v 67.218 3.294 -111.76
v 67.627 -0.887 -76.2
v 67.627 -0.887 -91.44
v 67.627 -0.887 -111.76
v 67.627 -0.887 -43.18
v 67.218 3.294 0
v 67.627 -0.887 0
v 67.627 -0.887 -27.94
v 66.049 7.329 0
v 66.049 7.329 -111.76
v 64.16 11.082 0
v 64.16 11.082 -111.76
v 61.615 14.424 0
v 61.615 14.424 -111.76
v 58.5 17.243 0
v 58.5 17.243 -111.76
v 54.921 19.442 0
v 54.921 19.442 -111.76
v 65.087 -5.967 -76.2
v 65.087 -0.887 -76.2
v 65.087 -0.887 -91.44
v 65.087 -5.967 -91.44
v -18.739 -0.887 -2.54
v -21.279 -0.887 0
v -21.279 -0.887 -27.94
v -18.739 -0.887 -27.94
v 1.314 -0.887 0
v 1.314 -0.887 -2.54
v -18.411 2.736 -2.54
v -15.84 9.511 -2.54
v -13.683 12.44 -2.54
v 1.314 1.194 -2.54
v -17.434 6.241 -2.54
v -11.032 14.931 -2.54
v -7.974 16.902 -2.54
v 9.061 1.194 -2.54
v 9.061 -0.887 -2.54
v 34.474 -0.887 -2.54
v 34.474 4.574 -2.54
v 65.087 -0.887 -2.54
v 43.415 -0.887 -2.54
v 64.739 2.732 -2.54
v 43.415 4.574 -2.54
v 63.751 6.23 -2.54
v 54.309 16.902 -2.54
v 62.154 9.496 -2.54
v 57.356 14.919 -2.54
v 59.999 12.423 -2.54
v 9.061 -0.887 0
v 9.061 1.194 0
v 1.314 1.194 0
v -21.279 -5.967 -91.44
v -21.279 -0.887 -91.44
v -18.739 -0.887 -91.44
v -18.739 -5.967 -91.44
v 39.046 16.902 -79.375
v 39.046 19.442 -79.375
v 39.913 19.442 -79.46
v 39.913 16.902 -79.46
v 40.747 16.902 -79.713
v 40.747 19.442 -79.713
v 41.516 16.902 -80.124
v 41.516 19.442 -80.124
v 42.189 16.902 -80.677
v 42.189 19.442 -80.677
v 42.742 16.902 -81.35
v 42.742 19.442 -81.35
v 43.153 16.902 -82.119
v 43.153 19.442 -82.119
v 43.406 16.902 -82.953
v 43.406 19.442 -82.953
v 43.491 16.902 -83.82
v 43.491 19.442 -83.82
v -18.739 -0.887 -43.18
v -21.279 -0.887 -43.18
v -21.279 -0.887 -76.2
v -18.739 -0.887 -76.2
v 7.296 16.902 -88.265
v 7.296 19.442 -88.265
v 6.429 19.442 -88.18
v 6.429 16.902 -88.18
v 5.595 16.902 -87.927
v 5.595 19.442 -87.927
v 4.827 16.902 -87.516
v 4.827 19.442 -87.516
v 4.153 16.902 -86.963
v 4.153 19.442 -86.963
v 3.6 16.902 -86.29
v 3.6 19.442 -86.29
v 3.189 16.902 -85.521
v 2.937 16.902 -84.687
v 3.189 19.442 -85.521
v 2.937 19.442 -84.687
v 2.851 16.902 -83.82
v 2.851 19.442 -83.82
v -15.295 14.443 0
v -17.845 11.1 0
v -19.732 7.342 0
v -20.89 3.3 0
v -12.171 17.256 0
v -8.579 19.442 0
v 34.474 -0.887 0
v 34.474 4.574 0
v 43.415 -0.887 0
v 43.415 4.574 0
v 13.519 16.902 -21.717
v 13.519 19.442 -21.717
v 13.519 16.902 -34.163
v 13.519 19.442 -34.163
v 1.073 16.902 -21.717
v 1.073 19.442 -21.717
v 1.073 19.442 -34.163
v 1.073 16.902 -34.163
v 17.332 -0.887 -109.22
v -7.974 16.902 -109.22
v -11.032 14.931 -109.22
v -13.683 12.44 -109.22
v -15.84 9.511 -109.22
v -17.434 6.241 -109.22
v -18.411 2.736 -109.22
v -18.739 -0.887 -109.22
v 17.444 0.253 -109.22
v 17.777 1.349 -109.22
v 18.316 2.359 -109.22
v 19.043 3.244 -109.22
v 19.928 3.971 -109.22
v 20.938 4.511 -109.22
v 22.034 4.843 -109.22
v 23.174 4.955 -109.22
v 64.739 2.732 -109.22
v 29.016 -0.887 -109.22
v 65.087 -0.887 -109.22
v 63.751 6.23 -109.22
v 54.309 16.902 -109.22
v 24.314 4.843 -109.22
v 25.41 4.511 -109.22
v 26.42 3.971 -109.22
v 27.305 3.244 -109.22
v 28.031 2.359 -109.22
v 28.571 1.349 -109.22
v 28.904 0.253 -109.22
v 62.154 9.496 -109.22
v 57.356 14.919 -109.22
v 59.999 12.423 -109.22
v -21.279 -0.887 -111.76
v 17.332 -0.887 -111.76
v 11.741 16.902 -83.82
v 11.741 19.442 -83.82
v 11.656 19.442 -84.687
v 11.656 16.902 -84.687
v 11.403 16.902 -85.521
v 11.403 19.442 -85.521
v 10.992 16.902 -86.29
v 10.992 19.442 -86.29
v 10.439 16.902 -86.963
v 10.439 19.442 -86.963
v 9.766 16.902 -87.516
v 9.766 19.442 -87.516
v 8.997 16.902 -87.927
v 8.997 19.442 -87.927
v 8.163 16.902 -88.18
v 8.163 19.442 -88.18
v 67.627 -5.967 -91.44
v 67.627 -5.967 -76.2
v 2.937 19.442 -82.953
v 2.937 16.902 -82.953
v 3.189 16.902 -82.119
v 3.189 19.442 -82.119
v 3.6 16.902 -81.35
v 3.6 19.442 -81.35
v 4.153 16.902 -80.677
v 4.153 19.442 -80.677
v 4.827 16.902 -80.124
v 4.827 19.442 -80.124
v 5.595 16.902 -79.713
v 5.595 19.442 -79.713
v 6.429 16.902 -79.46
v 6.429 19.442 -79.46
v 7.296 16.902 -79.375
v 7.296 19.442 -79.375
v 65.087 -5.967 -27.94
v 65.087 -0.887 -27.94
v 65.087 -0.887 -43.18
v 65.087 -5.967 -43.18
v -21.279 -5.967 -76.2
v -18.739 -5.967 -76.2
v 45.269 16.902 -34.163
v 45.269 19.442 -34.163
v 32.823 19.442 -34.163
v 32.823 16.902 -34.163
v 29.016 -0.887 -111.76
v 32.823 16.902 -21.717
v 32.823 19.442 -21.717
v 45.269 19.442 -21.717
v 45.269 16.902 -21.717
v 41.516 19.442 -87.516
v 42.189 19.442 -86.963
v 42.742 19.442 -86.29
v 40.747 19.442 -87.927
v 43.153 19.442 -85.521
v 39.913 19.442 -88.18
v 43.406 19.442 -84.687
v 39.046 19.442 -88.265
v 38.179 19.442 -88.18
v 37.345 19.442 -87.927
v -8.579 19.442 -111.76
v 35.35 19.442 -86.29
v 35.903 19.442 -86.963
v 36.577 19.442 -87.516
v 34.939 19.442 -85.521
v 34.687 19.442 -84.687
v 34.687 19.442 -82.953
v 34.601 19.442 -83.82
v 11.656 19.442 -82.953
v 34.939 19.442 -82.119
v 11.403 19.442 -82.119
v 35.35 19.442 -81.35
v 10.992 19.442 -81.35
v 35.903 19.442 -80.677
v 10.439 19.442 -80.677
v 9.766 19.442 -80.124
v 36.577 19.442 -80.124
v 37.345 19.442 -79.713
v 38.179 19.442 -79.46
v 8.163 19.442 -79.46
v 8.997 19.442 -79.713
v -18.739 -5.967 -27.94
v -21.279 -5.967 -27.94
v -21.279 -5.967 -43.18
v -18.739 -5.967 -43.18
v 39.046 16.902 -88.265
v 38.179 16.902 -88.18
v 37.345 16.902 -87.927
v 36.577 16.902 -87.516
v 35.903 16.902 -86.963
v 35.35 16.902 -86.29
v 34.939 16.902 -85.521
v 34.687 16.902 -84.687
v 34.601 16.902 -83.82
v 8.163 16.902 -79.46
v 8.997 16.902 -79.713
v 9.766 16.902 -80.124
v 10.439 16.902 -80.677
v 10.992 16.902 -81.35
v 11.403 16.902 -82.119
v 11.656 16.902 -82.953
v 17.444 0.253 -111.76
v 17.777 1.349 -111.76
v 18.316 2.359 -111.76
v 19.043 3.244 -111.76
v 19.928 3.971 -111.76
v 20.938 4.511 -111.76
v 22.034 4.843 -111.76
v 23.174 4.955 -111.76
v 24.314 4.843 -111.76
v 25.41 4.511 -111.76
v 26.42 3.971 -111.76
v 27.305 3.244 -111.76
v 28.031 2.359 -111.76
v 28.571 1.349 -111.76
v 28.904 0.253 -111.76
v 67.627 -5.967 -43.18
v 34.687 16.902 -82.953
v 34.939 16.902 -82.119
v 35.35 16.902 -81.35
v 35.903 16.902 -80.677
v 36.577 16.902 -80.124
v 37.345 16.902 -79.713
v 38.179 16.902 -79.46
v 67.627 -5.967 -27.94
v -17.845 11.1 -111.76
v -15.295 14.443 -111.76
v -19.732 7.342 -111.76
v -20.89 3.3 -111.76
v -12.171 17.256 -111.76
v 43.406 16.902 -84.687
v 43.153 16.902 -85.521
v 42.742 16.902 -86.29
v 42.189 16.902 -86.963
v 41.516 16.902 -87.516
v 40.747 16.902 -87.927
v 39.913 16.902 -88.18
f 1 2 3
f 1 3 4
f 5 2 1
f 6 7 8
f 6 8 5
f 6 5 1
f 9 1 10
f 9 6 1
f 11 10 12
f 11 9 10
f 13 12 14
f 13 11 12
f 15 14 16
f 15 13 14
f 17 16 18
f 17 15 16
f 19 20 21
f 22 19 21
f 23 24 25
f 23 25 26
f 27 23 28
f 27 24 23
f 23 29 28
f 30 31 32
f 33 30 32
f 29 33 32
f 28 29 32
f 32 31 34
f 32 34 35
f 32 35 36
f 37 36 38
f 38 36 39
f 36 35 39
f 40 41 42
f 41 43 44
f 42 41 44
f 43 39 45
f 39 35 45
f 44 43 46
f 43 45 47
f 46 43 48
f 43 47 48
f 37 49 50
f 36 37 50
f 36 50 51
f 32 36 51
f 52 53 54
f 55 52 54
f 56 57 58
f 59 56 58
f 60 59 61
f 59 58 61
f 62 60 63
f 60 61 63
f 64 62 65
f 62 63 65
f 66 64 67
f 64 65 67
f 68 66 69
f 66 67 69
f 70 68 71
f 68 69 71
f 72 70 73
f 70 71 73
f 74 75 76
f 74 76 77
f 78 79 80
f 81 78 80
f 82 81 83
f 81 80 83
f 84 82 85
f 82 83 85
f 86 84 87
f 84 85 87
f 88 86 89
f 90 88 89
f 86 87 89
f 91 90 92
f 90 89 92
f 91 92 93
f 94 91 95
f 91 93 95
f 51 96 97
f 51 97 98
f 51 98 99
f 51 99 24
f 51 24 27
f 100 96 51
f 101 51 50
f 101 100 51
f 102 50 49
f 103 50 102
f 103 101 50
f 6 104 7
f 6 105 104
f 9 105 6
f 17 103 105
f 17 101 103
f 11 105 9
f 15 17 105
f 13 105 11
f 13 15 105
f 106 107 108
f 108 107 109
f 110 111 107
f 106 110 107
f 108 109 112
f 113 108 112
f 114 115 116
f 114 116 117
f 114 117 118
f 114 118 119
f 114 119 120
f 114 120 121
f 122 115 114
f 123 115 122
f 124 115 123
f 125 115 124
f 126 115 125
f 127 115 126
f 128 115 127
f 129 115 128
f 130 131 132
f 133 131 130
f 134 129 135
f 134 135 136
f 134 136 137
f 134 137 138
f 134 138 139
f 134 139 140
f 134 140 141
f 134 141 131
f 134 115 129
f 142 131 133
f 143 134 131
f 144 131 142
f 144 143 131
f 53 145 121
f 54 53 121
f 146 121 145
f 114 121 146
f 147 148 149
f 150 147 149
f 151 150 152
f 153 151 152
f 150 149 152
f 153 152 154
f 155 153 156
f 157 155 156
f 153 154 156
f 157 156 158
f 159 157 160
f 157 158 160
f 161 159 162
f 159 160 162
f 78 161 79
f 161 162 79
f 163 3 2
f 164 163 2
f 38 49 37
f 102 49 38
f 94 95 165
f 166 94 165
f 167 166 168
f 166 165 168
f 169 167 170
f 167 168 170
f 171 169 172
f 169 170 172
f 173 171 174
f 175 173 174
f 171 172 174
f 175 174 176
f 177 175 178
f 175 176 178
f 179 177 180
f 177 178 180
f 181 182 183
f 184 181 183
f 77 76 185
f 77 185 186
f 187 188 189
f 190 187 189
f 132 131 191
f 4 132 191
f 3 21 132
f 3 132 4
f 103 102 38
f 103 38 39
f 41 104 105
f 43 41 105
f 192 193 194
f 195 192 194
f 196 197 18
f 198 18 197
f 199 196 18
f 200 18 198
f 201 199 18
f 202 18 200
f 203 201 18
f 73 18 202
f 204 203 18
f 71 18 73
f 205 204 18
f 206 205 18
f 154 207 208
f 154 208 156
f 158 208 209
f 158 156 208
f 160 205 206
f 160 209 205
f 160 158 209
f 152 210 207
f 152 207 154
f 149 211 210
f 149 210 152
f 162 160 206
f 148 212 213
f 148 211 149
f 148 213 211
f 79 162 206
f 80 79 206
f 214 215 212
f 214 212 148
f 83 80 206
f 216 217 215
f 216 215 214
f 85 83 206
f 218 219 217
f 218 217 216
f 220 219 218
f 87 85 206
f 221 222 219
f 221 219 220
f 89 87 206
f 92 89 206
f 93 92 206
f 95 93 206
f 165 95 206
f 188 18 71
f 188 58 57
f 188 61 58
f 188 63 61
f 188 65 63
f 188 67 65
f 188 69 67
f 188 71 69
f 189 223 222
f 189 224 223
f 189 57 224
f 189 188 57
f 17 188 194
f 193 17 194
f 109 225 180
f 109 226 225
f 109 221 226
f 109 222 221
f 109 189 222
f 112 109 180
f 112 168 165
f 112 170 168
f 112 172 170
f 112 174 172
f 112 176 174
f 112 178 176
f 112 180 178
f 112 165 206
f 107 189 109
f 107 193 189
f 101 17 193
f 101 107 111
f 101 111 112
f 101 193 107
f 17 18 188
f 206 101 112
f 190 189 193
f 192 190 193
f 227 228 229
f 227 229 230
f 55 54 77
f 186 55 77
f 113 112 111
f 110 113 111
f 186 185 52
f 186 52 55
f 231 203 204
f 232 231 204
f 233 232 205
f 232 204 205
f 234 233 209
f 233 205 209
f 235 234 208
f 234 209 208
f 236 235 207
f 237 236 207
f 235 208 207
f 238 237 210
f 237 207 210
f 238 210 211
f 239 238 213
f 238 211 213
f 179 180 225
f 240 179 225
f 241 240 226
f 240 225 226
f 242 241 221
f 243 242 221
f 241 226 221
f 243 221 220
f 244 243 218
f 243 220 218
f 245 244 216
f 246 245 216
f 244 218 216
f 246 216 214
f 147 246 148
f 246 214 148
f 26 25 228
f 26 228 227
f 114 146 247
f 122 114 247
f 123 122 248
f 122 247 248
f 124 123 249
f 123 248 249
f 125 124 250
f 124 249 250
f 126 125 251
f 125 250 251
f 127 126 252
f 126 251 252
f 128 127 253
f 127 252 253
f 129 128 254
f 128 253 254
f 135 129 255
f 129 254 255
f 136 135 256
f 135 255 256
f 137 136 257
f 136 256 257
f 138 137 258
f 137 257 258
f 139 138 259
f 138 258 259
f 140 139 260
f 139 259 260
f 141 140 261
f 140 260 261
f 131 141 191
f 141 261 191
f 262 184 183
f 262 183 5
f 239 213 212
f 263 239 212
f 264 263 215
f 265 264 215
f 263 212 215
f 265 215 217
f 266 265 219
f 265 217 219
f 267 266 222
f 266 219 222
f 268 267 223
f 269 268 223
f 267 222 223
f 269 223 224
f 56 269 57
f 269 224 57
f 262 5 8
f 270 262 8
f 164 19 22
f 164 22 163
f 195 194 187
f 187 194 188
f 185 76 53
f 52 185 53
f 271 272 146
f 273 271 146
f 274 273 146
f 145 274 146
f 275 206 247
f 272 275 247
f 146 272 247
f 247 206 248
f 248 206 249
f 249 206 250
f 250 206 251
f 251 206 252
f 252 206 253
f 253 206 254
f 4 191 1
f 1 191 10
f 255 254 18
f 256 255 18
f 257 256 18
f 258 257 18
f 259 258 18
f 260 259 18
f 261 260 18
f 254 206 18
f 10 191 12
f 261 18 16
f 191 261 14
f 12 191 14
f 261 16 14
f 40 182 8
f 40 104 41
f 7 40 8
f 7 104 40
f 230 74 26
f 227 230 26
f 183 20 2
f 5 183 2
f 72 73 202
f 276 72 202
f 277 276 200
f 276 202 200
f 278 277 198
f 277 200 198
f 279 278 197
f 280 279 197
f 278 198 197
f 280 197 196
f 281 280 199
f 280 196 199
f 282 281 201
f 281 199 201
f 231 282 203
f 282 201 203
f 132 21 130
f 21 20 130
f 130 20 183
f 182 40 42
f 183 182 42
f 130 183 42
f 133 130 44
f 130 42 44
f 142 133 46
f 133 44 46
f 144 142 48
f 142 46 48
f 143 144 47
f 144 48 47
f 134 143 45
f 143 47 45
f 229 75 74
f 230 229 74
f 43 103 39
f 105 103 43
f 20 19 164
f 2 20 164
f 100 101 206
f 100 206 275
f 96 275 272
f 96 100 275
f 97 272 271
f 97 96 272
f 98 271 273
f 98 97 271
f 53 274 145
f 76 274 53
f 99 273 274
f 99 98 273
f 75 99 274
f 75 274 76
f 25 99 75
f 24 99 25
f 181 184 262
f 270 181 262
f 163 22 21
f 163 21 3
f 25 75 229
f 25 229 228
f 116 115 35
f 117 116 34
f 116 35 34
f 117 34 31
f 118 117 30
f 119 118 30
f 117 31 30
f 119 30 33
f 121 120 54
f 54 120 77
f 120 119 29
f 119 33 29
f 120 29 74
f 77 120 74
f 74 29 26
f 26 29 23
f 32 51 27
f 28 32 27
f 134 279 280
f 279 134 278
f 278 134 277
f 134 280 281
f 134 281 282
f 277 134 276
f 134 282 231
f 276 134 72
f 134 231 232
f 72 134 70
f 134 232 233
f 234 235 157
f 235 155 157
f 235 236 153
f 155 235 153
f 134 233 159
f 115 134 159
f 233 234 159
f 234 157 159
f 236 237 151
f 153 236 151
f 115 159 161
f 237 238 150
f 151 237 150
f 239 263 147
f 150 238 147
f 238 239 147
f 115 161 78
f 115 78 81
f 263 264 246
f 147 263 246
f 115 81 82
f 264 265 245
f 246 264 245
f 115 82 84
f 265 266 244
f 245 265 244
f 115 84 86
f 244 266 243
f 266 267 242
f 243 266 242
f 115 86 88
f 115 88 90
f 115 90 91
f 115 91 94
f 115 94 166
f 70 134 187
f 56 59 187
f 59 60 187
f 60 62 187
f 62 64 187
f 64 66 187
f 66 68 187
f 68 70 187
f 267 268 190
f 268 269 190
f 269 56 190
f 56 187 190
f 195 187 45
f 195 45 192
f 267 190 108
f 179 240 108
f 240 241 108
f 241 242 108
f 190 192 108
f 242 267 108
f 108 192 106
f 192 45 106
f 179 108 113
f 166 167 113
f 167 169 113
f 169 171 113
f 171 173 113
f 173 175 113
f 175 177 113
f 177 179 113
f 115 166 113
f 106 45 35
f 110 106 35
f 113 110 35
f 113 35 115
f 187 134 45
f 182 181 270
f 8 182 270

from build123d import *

# Parameters (mm, degrees)
F0_W      = 8.9408
F0_H      = 5.461
F1_DEPTH  = 111.76
F2_T      = -2.54
F4_DEPTH  = 25.4
F5_DEPTH  = 25.4
F7_DEPTH  = 25.4
F8_W      = 2.5400399546
F8_H      = 7.62
F9_DEPTH  = 5.08
F10_W     = 2.5400002226
F10_H     = 15.24
F10_H_2   = 7.62
F11_DEPTH = 5.08
F12_W     = 6.223
F12_H     = 6.223
F13_DEPTH = 25.4


with BuildPart() as f1:
    # F0 (on Top) → F1 (new body)
    with BuildSketch(Plane.XY):
        with BuildLine():
            Line((54.9210952491, 19.4422315109), (-8.5789047509, 19.4422315109))
            ThreePointArc((-8.5789047509, 19.4422315109), (-17.8451170094, 11.099606562), (-21.2789029923, -0.8866853785))
            Line((-21.2789029923, -0.8866853785), (9.0740952491, -0.8866853785))
            Line((9.0740952491, -0.8866853785), (34.4740952491, -0.8866853785))
            Line((34.4740952491, -0.8866853785), (34.4740952491, 4.5743146215))
            Line((34.4740952491, 4.5743146215), (43.4148952491, 4.5743146215))
            Line((43.4148952491, 4.5743146215), (43.4148952491, -0.8866853785))
            Line((43.4148952491, -0.8866853785), (67.6266683049, -0.8866853785))
            ThreePointArc((67.6266683049, -0.8866853785), (64.1599500532, 11.0815657388), (54.9210952491, 19.4422315109))
        make_face()
        with Locations((38.9444952491, 1.8438146215)):
            Rectangle(F0_W, F0_H)
    extrude(amount=-F1_DEPTH)

    # F2
    f2_openings = [f1.faces().sort_by_distance(p)[0] for p in [
        (23.173883, -0.886685, -55.88),
    ]]
    offset(amount=F2_T, openings=f2_openings)

    # F3 (on face) → F4 (cut)
    with BuildSketch(Plane.XY):
        Polygon((1.3137662318, 1.1936101676), (1.3137662318, -0.8866853785), (9.0607662318, -0.8866853785), (9.0607662318, 1.1936101676), (1.3270952491, 1.1936101676), align=None)
    extrude(amount=-F4_DEPTH, mode=Mode.SUBTRACT)

    # F0 (on Top) → F5 (cut)
    with BuildSketch(Plane.XY):
        with Locations((38.9444952491, 1.8438146215)):
            Rectangle(F0_W, F0_H)
    extrude(amount=-F5_DEPTH, mode=Mode.SUBTRACT)

    # F6 (on face) → F7 (cut)
    with BuildSketch(Plane(origin=(0, 0, -111.76), x_dir=(1, 0, 0), z_dir=(0, 0, -1))):
        with BuildLine():
            Line((29.0158826563, 0.8866853785), (17.3318826563, 0.8866853785))
            ThreePointArc((17.3318826563, 0.8866853785), (23.1738826563, -4.9553146215), (29.0158826563, 0.8866853785))
        make_face()
    extrude(amount=-F7_DEPTH, mode=Mode.SUBTRACT)

    # F8 (on face) → F9 (join)
    with BuildSketch(Plane.XZ.offset(0.8866853785)):
        with Locations((66.3566483276, -31.75)):
            Rectangle(F8_W, F8_H)
        with Locations((66.3566483276, -39.37)):
            Rectangle(F8_W, F8_H)
        with Locations((66.3566483276, -80.01)):
            Rectangle(F8_W, F8_H)
        with Locations((66.3566483276, -87.63)):
            Rectangle(F8_W, F8_H)
    extrude(amount=F9_DEPTH)

    # F10 (on face) → F11 (join)
    with BuildSketch(Plane.XZ.offset(0.8866853785)):
        with Locations((-20.008902881, -35.56)):
            Rectangle(F10_W, F10_H)
        with Locations((-20.008902881, -80.01)):
            Rectangle(F10_W, F10_H_2)
        with Locations((-20.008902881, -87.63)):
            Rectangle(F10_W, F10_H_2)
    extrude(amount=F11_DEPTH)

    # F12 (on face) → F13 (cut)
    with BuildSketch(Plane(origin=(0, 19.4422315109, 0), x_dir=(-1, 0, 0), z_dir=(0, 1, 0))):
        with Locations((-4.1845952491, -24.8285)):
            Rectangle(F12_W, F12_H)
        with Locations((-10.4075952491, -24.8285)):
            Rectangle(F12_W, F12_H)
        with Locations((-10.4075952491, -31.0515)):
            Rectangle(F12_W, F12_H)
        with Locations((-4.1845952491, -31.0515)):
            Rectangle(F12_W, F12_H)
        with Locations((-35.9345952491, -24.8285)):
            Rectangle(F12_W, F12_H)
        with Locations((-42.1575952491, -24.8285)):
            Rectangle(F12_W, F12_H)
        with Locations((-42.1575952491, -31.0515)):
            Rectangle(F12_W, F12_H)
        with Locations((-35.9345952491, -31.0515)):
            Rectangle(F12_W, F12_H)
        with BuildLine():
            Line((-39.0460952491, -83.82), (-39.0460952491, -79.375))
            ThreePointArc((-39.0460952491, -79.375), (-42.1891848914, -80.6769103576), (-43.4910952491, -83.82))
            Line((-43.4910952491, -83.82), (-39.0460952491, -83.82))
        make_face()
        with BuildLine():
            Line((-39.0460952491, -88.265), (-39.0460952491, -83.82))
            Line((-39.0460952491, -83.82), (-43.4910952491, -83.82))
            ThreePointArc((-43.4910952491, -83.82), (-42.1891848914, -86.9630896424), (-39.0460952491, -88.265))
        make_face()
        with BuildLine():
            ThreePointArc((-39.0460952491, -88.265), (-35.9030056067, -86.9630896424), (-34.6010952491, -83.82))
            Line((-34.6010952491, -83.82), (-39.0460952491, -83.82))
            Line((-39.0460952491, -83.82), (-39.0460952491, -88.265))
        make_face()
        with BuildLine():
            Line((-39.0460952491, -83.82), (-34.6010952491, -83.82))
            ThreePointArc((-34.6010952491, -83.82), (-35.9030056067, -80.6769103576), (-39.0460952491, -79.375))
            Line((-39.0460952491, -79.375), (-39.0460952491, -83.82))
        make_face()
        with BuildLine():
            ThreePointArc((-7.2960952491, -79.375), (-10.4391848914, -80.6769103576), (-11.7410952491, -83.82))
            Line((-11.7410952491, -83.82), (-7.2960952491, -83.82))
            Line((-7.2960952491, -83.82), (-7.2960952491, -79.375))
        make_face()
        with BuildLine():
            Line((-7.2960952491, -83.82), (-11.7410952491, -83.82))
            ThreePointArc((-11.7410952491, -83.82), (-10.4391848914, -86.9630896424), (-7.2960952491, -88.265))
            Line((-7.2960952491, -88.265), (-7.2960952491, -83.82))
        make_face()
        with BuildLine():
            Line((-2.8510952491, -83.82), (-7.2960952491, -83.82))
            Line((-7.2960952491, -83.82), (-7.2960952491, -88.265))
            ThreePointArc((-7.2960952491, -88.265), (-4.1530056067, -86.9630896424), (-2.8510952491, -83.82))
        make_face()
        with BuildLine():
            ThreePointArc((-2.8510952491, -83.82), (-4.1530056067, -80.6769103576), (-7.2960952491, -79.375))
            Line((-7.2960952491, -79.375), (-7.2960952491, -83.82))
            Line((-7.2960952491, -83.82), (-2.8510952491, -83.82))
        make_face()
    extrude(amount=-F13_DEPTH, mode=Mode.SUBTRACT)


solid = f1.part
